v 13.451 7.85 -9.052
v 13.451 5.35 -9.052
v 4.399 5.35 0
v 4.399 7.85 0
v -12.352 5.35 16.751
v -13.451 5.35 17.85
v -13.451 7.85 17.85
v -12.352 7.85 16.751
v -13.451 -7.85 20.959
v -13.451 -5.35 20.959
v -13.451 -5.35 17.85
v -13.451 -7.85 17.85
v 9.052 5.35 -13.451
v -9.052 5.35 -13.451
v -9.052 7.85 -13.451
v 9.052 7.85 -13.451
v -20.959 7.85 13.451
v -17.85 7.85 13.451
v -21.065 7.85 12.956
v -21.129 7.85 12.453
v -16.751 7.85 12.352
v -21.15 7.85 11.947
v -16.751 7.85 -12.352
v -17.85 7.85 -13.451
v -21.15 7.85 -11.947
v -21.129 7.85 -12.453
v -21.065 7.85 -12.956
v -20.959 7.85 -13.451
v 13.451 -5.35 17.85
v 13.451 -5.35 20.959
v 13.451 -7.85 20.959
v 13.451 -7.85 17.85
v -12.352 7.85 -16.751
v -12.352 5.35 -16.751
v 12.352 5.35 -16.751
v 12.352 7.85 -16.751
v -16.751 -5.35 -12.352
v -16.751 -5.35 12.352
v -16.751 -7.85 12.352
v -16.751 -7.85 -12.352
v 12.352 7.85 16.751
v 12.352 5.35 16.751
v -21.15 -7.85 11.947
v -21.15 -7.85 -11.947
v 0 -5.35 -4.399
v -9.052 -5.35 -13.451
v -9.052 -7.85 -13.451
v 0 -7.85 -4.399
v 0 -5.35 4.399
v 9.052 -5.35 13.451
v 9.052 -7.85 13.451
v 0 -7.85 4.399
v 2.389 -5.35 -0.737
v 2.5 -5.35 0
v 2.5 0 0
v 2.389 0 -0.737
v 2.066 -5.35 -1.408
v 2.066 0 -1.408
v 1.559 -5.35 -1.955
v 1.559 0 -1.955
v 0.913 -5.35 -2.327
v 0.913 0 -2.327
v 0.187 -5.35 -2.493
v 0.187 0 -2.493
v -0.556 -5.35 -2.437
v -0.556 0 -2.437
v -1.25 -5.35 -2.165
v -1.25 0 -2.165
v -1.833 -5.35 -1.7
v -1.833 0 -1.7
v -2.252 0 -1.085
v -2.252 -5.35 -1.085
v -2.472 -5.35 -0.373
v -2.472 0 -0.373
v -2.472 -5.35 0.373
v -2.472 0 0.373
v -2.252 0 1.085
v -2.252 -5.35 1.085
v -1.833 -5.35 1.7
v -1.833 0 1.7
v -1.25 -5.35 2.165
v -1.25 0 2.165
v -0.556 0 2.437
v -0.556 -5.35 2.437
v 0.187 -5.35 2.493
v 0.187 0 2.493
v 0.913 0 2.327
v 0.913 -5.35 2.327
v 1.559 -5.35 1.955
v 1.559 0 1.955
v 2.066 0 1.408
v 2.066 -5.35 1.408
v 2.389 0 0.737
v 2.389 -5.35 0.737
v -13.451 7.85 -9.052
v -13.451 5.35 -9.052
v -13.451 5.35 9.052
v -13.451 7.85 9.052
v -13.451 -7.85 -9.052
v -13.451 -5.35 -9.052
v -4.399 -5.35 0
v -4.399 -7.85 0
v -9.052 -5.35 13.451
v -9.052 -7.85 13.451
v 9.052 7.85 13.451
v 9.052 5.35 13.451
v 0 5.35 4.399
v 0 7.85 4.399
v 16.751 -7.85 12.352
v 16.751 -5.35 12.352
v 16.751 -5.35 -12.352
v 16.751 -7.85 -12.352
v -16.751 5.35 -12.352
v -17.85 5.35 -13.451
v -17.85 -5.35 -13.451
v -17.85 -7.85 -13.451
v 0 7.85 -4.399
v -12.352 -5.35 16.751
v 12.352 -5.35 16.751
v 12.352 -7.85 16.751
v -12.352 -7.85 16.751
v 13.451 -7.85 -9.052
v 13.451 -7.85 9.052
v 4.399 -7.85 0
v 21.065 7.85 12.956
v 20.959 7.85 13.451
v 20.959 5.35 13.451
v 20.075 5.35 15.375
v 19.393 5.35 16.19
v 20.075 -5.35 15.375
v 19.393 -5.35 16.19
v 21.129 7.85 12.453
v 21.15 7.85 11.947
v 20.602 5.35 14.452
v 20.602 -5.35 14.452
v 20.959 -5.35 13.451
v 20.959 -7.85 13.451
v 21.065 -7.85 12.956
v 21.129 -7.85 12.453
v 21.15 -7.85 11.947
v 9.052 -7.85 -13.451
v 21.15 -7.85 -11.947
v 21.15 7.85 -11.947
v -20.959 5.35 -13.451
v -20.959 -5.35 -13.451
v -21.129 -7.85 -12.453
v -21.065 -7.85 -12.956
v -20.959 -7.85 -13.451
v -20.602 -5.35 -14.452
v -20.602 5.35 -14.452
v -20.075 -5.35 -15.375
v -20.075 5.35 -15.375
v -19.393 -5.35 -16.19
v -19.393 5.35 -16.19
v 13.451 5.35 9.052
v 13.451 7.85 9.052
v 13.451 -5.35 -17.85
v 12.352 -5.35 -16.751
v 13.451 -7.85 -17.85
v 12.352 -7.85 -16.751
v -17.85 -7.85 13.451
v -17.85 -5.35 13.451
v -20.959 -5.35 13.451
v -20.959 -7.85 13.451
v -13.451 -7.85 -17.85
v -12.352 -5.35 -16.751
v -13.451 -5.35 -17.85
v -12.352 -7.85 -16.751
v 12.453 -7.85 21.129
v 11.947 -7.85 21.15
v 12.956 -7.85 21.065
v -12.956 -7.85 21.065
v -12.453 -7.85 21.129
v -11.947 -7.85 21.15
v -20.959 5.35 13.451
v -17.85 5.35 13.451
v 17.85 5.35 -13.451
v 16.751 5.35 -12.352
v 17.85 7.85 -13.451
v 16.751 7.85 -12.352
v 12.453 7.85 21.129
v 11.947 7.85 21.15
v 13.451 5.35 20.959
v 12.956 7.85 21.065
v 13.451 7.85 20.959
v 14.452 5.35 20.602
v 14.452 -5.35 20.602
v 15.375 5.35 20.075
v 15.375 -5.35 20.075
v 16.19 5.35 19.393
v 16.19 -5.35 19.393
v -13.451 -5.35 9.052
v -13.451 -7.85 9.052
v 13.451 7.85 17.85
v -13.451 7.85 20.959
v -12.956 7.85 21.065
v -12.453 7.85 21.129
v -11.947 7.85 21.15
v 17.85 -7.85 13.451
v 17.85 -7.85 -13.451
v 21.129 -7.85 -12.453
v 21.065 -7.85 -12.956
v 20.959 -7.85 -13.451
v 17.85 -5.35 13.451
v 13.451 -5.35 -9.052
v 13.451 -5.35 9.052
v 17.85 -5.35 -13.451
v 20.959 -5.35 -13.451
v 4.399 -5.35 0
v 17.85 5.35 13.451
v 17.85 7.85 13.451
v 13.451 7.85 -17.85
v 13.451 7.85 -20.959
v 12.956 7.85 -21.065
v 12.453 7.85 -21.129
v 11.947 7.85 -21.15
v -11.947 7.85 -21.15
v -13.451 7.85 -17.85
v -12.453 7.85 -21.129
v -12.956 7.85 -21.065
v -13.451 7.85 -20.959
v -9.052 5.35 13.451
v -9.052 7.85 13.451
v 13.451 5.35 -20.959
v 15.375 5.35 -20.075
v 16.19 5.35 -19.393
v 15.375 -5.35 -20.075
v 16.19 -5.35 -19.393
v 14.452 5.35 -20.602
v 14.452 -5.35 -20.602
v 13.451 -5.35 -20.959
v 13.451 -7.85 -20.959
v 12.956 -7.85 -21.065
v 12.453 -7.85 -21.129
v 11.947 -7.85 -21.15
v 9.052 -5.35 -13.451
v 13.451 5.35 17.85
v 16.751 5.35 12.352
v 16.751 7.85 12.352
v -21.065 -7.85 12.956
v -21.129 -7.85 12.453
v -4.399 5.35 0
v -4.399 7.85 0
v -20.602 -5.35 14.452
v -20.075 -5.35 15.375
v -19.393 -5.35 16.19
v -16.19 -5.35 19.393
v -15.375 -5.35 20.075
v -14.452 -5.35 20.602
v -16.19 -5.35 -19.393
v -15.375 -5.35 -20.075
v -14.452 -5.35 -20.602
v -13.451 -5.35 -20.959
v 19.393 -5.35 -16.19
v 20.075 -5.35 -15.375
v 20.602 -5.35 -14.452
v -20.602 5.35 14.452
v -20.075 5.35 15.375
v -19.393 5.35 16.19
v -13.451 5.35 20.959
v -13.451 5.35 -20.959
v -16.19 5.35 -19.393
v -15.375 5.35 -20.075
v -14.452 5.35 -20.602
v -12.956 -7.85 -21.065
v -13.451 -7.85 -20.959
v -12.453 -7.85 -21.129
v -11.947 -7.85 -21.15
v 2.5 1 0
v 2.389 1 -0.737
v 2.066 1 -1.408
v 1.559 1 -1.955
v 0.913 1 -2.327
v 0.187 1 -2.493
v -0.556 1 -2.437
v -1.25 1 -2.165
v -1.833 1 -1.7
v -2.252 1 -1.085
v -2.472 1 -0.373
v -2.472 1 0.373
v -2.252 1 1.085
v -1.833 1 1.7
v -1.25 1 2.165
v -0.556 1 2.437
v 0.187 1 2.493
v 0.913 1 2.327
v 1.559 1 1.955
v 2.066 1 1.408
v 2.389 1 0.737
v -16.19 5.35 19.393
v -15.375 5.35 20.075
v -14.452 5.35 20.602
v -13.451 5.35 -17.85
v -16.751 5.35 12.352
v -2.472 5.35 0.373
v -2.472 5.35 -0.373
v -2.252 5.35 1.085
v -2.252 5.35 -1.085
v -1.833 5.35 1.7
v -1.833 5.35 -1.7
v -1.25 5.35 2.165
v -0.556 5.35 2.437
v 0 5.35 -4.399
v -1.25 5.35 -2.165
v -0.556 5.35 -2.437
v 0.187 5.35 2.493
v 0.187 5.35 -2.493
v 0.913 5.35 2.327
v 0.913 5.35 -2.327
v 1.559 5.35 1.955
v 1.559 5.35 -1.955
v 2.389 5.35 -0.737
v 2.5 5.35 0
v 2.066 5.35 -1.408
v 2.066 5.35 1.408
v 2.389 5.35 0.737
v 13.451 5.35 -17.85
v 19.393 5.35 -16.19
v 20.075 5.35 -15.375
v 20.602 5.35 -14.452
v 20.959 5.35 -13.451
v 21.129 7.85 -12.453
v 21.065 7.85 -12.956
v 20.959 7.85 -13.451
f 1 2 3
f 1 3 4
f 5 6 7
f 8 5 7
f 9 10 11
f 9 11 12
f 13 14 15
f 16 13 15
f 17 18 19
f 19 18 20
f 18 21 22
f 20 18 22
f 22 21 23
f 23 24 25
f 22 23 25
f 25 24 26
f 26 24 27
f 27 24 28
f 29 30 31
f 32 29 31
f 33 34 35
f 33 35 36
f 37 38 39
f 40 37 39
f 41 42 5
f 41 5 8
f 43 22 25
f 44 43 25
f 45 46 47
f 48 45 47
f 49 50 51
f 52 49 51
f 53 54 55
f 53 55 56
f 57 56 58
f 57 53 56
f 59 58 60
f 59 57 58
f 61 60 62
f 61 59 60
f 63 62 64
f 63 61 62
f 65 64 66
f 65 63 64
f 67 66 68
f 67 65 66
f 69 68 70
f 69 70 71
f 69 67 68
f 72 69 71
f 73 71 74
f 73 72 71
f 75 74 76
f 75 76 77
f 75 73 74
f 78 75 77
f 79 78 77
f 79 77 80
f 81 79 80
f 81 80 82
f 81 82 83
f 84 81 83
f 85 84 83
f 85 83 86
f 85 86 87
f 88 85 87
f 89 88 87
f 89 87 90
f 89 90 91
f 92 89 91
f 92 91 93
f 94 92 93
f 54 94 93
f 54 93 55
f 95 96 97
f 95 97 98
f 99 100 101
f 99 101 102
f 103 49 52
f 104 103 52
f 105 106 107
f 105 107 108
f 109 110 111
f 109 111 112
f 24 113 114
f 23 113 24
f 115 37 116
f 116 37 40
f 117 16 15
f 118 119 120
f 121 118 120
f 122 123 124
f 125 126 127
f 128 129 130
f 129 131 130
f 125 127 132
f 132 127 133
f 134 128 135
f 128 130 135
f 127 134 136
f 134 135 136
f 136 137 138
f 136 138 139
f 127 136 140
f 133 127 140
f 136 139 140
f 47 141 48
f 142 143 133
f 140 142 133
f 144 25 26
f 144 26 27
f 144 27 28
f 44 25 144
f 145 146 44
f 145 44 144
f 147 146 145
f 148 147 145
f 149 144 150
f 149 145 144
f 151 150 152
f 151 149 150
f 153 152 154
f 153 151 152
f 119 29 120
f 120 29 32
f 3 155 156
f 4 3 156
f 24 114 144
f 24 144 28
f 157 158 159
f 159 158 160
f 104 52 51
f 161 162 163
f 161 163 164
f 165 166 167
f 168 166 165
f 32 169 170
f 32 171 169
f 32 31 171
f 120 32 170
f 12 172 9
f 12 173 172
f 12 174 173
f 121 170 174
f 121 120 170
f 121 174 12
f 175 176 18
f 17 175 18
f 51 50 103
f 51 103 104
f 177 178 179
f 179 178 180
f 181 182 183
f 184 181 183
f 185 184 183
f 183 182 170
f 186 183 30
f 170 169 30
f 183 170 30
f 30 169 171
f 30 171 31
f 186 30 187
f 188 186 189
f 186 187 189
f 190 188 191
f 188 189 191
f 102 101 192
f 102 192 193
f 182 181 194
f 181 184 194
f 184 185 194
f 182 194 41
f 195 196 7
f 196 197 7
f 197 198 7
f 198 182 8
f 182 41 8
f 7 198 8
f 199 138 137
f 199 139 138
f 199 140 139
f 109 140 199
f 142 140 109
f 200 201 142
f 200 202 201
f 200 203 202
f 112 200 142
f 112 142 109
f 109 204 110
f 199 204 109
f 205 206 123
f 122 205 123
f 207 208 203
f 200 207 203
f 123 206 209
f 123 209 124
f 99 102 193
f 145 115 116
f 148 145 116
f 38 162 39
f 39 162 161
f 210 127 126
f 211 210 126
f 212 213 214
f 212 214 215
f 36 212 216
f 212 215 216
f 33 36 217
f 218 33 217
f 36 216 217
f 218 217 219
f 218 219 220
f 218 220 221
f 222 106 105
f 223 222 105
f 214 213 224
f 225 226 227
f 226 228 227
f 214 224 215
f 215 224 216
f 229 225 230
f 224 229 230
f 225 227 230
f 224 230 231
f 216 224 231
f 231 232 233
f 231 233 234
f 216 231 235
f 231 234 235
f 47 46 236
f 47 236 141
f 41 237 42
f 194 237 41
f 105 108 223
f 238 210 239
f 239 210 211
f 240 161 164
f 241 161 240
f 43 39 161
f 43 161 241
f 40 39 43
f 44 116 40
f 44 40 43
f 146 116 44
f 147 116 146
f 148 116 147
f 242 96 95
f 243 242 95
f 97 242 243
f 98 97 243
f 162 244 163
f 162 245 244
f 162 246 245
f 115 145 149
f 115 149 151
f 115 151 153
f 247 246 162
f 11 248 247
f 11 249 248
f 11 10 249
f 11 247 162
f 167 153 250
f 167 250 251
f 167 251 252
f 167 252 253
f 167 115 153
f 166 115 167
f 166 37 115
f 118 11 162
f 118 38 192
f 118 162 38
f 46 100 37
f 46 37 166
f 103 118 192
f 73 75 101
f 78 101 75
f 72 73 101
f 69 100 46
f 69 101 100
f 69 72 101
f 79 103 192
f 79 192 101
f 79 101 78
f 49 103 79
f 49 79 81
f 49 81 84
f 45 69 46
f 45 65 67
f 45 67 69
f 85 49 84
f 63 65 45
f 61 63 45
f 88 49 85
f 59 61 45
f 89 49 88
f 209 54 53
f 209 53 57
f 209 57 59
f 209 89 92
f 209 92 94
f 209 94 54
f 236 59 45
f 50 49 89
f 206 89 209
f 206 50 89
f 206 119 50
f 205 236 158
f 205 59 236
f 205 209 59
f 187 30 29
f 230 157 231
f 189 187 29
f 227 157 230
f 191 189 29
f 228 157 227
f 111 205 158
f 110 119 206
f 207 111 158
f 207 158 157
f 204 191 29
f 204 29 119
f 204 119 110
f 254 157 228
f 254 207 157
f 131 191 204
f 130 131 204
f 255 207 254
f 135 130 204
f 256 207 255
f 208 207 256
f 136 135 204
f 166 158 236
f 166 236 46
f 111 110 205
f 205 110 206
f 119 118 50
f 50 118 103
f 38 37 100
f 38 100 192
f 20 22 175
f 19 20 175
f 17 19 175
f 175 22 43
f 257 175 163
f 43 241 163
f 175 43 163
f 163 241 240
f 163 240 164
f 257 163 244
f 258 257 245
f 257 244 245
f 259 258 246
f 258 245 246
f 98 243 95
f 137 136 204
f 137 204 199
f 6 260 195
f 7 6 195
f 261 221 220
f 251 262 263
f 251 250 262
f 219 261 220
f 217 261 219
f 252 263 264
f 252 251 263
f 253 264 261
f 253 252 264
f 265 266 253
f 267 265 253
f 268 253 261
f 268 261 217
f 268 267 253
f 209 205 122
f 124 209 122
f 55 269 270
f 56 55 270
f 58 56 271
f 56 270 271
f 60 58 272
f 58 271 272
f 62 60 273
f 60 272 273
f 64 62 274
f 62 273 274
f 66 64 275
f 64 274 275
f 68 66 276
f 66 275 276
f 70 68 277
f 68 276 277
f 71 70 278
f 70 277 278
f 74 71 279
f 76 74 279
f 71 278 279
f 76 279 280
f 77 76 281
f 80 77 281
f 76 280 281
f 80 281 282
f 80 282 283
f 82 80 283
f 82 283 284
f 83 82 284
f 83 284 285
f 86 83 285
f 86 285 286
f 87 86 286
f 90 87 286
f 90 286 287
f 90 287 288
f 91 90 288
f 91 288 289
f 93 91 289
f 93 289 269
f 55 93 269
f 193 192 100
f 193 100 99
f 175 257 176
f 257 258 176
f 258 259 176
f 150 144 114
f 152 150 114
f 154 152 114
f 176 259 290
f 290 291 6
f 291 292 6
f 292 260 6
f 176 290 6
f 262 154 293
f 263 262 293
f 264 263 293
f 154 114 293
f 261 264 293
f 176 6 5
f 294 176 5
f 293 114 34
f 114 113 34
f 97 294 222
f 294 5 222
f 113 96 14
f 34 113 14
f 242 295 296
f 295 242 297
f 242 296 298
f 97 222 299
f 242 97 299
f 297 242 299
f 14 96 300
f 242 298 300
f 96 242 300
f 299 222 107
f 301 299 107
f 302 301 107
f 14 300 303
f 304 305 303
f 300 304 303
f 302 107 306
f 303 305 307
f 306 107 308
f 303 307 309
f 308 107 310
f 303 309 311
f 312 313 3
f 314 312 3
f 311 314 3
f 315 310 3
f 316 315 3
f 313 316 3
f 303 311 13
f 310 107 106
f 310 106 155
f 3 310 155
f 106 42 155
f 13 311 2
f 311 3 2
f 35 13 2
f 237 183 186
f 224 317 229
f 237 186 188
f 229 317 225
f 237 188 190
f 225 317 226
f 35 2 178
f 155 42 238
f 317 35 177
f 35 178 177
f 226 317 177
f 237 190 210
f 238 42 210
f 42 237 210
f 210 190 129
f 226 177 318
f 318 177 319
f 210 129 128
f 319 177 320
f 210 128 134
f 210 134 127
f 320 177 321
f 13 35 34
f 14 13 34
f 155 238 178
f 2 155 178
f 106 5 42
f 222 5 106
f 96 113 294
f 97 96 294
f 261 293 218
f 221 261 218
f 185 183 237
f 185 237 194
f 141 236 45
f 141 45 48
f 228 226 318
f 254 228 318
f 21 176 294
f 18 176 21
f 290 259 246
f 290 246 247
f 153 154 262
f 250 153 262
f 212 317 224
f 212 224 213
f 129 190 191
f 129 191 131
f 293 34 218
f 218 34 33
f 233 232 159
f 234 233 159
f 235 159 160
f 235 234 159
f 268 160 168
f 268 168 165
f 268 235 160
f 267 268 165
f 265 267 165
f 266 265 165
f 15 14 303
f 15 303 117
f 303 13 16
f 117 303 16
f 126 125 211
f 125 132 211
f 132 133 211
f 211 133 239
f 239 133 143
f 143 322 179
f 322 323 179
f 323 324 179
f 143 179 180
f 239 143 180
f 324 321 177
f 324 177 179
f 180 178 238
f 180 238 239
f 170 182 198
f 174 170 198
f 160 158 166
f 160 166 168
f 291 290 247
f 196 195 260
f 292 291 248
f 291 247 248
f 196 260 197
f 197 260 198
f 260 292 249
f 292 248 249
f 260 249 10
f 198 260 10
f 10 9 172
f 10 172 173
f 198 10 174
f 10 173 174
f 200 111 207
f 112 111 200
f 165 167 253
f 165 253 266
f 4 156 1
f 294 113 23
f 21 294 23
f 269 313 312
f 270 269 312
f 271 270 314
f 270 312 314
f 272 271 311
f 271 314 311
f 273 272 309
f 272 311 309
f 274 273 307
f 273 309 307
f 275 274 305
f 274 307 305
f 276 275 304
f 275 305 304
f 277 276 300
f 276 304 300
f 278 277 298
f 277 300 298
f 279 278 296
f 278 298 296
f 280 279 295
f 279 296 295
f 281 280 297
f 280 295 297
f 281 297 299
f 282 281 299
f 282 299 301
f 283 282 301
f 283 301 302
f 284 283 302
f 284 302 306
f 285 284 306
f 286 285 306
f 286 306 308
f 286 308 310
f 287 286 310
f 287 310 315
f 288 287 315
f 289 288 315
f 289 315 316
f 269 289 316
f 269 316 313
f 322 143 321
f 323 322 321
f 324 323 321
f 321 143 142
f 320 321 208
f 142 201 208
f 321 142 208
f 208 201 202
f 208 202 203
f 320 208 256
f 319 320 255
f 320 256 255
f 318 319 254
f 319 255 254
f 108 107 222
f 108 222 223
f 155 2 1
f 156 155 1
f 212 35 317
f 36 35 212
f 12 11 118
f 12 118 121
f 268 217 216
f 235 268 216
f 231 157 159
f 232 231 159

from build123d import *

# Parameters (mm, degrees)
BOSS_EXTRUDE1_DEPTH = 7.85
SKETCH18_W          = 3.3
SKETCH18_H          = 2.5
CUT_EXTRUDE10_DEPTH = 43.3
SKETCH19_W          = 3.3
SKETCH19_H          = 2.5
CUT_EXTRUDE11_DEPTH = 43.3
SKETCH20_W          = 6.221233688
SKETCH20_H          = 2.5
CUT_EXTRUDE12_DEPTH = 57.710616844
SKETCH21_W          = 6.221233688
SKETCH21_H          = 2.5
CUT_EXTRUDE13_DEPTH = 57.710616844
SKETCH22_R          = 2.5
CUT_EXTRUDE14_DEPTH = 6.35
CUT_EXTRUDE15_DEPTH = 14.2
FILLET8_R           = 6


with BuildPart() as part:
    # Sketch1 → Boss-Extrude1 (new body)
    with BuildSketch(Plane(origin=(0, 0, 0), x_dir=(1, 0, 0), z_dir=(0, 1, 0))):
        Polygon((-21.15, 16.750923472), (-16.750923472, 21.15), (16.750923472, 21.15), (21.15, 16.750923472), (21.15, -16.750923472), (16.750923472, -21.15), (-16.750923472, -21.15), (-21.15, -16.750923472), align=None)
    boss_extrude1 = extrude(amount=BOSS_EXTRUDE1_DEPTH)

    # Sketch18 → Cut-Extrude10 (cut, through all)
    with BuildSketch(Plane.XY.offset(21.15)):
        with Locations((15.100923472, 6.6)):
            Rectangle(SKETCH18_W, SKETCH18_H)
        with Locations((-15.100923472, 6.6)):
            Rectangle(SKETCH18_W, SKETCH18_H)
    cut_extrude10 = extrude(amount=-CUT_EXTRUDE10_DEPTH, mode=Mode.SUBTRACT)

    # Sketch19 → Cut-Extrude11 (cut, through all)
    with BuildSketch(Plane(origin=(21.15, 0, 0), x_dir=(0, 0, -1), z_dir=(1, 0, 0))):
        with Locations((-15.100923472, 6.6)):
            Rectangle(SKETCH19_W, SKETCH19_H)
        with Locations((15.100923472, 6.6)):
            Rectangle(SKETCH19_W, SKETCH19_H)
    cut_extrude11 = extrude(amount=-CUT_EXTRUDE11_DEPTH, mode=Mode.SUBTRACT)

    # Sketch20 → Cut-Extrude12 (cut, through all)
    with BuildSketch(Plane(origin=(18.950461736, 0, 18.950461736), x_dir=(0.707106781, 0, -0.707106781), z_dir=(0.707106781, 0, 0.707106781))):
        with Locations((0, 6.6)):
            Rectangle(SKETCH20_W, SKETCH20_H)
    cut_extrude12 = extrude(amount=-CUT_EXTRUDE12_DEPTH, mode=Mode.SUBTRACT)

    # Sketch21 → Cut-Extrude13 (cut, through all)
    with BuildSketch(Plane(origin=(-18.950461736, 0, 18.950461736), x_dir=(0.707106781, 0, 0.707106781), z_dir=(-0.707106781, 0, 0.707106781))):
        with Locations((0, 6.6)):
            Rectangle(SKETCH21_W, SKETCH21_H)
    cut_extrude13 = extrude(amount=-CUT_EXTRUDE13_DEPTH, mode=Mode.SUBTRACT)

    # Sketch22 → Cut-Extrude14 (cut, through all)
    with BuildSketch(Plane(origin=(0, 5.35, 0), x_dir=(1, 0, 0), z_dir=(0, 1, 0))):
        Circle(SKETCH22_R)
    cut_extrude14 = extrude(amount=-CUT_EXTRUDE14_DEPTH, mode=Mode.SUBTRACT)

    # Mirror1: Boss-Extrude1, Cut-Extrude10, Cut-Extrude11, Cut-Extrude12, Cut-Extrude13, Cut-Extrude14 across plane
    add(boss_extrude1.mirror(Plane(origin=(0, 0, 0), x_dir=(0, 0, 1), z_dir=(0, -1, 0))))
    add(cut_extrude10.mirror(Plane(origin=(0, 0, 0), x_dir=(0, 0, 1), z_dir=(0, -1, 0))), mode=Mode.SUBTRACT)
    add(cut_extrude11.mirror(Plane(origin=(0, 0, 0), x_dir=(0, 0, 1), z_dir=(0, -1, 0))), mode=Mode.SUBTRACT)
    add(cut_extrude12.mirror(Plane(origin=(0, 0, 0), x_dir=(0, 0, 1), z_dir=(0, -1, 0))), mode=Mode.SUBTRACT)
    add(cut_extrude13.mirror(Plane(origin=(0, 0, 0), x_dir=(0, 0, 1), z_dir=(0, -1, 0))), mode=Mode.SUBTRACT)
    add(cut_extrude14.mirror(Plane(origin=(0, 0, 0), x_dir=(0, 0, 1), z_dir=(0, -1, 0))), mode=Mode.SUBTRACT)

    # Sketch23 → Cut-Extrude15 (cut, through all)
    with BuildSketch(Plane(origin=(0, 5.35, 0), x_dir=(1, 0, 0), z_dir=(0, 1, 0))):
        Polygon((-21.15, -14.432485579), (-14.432485579, -21.15), (-16.750923472, -21.15), (-21.15, -16.750923472), align=None)
        Polygon((-21.15, 14.432485579), (-14.432485579, 21.15), (-16.750923472, 21.15), (-21.15, 16.750923472), align=None)
        Polygon((14.432485579, 21.15), (21.15, 14.432485579), (21.15, 16.750923472), (16.750923472, 21.15), align=None)
        Polygon((14.432485579, -21.15), (21.15, -14.432485579), (21.15, -16.750923472), (16.750923472, -21.15), align=None)
    extrude(amount=-CUT_EXTRUDE15_DEPTH, mode=Mode.SUBTRACT)

    # Fillet8
    fillet8_edges = [part.edges().sort_by_distance(p)[0] for p in [
        (14.432485579, 0, -21.15),
        (21.15, 0, -14.432485579),
        (-21.15, 0, -14.432485579),
        (-14.432485579, 0, -21.15),
        (-14.432485579, 0, 21.15),
        (-21.15, 0, 14.432485579),
        (21.15, 0, 14.432485579),
        (14.432485579, 0, 21.15),
    ]]
    fillet(fillet8_edges, radius=FILLET8_R)


solid = part.part
